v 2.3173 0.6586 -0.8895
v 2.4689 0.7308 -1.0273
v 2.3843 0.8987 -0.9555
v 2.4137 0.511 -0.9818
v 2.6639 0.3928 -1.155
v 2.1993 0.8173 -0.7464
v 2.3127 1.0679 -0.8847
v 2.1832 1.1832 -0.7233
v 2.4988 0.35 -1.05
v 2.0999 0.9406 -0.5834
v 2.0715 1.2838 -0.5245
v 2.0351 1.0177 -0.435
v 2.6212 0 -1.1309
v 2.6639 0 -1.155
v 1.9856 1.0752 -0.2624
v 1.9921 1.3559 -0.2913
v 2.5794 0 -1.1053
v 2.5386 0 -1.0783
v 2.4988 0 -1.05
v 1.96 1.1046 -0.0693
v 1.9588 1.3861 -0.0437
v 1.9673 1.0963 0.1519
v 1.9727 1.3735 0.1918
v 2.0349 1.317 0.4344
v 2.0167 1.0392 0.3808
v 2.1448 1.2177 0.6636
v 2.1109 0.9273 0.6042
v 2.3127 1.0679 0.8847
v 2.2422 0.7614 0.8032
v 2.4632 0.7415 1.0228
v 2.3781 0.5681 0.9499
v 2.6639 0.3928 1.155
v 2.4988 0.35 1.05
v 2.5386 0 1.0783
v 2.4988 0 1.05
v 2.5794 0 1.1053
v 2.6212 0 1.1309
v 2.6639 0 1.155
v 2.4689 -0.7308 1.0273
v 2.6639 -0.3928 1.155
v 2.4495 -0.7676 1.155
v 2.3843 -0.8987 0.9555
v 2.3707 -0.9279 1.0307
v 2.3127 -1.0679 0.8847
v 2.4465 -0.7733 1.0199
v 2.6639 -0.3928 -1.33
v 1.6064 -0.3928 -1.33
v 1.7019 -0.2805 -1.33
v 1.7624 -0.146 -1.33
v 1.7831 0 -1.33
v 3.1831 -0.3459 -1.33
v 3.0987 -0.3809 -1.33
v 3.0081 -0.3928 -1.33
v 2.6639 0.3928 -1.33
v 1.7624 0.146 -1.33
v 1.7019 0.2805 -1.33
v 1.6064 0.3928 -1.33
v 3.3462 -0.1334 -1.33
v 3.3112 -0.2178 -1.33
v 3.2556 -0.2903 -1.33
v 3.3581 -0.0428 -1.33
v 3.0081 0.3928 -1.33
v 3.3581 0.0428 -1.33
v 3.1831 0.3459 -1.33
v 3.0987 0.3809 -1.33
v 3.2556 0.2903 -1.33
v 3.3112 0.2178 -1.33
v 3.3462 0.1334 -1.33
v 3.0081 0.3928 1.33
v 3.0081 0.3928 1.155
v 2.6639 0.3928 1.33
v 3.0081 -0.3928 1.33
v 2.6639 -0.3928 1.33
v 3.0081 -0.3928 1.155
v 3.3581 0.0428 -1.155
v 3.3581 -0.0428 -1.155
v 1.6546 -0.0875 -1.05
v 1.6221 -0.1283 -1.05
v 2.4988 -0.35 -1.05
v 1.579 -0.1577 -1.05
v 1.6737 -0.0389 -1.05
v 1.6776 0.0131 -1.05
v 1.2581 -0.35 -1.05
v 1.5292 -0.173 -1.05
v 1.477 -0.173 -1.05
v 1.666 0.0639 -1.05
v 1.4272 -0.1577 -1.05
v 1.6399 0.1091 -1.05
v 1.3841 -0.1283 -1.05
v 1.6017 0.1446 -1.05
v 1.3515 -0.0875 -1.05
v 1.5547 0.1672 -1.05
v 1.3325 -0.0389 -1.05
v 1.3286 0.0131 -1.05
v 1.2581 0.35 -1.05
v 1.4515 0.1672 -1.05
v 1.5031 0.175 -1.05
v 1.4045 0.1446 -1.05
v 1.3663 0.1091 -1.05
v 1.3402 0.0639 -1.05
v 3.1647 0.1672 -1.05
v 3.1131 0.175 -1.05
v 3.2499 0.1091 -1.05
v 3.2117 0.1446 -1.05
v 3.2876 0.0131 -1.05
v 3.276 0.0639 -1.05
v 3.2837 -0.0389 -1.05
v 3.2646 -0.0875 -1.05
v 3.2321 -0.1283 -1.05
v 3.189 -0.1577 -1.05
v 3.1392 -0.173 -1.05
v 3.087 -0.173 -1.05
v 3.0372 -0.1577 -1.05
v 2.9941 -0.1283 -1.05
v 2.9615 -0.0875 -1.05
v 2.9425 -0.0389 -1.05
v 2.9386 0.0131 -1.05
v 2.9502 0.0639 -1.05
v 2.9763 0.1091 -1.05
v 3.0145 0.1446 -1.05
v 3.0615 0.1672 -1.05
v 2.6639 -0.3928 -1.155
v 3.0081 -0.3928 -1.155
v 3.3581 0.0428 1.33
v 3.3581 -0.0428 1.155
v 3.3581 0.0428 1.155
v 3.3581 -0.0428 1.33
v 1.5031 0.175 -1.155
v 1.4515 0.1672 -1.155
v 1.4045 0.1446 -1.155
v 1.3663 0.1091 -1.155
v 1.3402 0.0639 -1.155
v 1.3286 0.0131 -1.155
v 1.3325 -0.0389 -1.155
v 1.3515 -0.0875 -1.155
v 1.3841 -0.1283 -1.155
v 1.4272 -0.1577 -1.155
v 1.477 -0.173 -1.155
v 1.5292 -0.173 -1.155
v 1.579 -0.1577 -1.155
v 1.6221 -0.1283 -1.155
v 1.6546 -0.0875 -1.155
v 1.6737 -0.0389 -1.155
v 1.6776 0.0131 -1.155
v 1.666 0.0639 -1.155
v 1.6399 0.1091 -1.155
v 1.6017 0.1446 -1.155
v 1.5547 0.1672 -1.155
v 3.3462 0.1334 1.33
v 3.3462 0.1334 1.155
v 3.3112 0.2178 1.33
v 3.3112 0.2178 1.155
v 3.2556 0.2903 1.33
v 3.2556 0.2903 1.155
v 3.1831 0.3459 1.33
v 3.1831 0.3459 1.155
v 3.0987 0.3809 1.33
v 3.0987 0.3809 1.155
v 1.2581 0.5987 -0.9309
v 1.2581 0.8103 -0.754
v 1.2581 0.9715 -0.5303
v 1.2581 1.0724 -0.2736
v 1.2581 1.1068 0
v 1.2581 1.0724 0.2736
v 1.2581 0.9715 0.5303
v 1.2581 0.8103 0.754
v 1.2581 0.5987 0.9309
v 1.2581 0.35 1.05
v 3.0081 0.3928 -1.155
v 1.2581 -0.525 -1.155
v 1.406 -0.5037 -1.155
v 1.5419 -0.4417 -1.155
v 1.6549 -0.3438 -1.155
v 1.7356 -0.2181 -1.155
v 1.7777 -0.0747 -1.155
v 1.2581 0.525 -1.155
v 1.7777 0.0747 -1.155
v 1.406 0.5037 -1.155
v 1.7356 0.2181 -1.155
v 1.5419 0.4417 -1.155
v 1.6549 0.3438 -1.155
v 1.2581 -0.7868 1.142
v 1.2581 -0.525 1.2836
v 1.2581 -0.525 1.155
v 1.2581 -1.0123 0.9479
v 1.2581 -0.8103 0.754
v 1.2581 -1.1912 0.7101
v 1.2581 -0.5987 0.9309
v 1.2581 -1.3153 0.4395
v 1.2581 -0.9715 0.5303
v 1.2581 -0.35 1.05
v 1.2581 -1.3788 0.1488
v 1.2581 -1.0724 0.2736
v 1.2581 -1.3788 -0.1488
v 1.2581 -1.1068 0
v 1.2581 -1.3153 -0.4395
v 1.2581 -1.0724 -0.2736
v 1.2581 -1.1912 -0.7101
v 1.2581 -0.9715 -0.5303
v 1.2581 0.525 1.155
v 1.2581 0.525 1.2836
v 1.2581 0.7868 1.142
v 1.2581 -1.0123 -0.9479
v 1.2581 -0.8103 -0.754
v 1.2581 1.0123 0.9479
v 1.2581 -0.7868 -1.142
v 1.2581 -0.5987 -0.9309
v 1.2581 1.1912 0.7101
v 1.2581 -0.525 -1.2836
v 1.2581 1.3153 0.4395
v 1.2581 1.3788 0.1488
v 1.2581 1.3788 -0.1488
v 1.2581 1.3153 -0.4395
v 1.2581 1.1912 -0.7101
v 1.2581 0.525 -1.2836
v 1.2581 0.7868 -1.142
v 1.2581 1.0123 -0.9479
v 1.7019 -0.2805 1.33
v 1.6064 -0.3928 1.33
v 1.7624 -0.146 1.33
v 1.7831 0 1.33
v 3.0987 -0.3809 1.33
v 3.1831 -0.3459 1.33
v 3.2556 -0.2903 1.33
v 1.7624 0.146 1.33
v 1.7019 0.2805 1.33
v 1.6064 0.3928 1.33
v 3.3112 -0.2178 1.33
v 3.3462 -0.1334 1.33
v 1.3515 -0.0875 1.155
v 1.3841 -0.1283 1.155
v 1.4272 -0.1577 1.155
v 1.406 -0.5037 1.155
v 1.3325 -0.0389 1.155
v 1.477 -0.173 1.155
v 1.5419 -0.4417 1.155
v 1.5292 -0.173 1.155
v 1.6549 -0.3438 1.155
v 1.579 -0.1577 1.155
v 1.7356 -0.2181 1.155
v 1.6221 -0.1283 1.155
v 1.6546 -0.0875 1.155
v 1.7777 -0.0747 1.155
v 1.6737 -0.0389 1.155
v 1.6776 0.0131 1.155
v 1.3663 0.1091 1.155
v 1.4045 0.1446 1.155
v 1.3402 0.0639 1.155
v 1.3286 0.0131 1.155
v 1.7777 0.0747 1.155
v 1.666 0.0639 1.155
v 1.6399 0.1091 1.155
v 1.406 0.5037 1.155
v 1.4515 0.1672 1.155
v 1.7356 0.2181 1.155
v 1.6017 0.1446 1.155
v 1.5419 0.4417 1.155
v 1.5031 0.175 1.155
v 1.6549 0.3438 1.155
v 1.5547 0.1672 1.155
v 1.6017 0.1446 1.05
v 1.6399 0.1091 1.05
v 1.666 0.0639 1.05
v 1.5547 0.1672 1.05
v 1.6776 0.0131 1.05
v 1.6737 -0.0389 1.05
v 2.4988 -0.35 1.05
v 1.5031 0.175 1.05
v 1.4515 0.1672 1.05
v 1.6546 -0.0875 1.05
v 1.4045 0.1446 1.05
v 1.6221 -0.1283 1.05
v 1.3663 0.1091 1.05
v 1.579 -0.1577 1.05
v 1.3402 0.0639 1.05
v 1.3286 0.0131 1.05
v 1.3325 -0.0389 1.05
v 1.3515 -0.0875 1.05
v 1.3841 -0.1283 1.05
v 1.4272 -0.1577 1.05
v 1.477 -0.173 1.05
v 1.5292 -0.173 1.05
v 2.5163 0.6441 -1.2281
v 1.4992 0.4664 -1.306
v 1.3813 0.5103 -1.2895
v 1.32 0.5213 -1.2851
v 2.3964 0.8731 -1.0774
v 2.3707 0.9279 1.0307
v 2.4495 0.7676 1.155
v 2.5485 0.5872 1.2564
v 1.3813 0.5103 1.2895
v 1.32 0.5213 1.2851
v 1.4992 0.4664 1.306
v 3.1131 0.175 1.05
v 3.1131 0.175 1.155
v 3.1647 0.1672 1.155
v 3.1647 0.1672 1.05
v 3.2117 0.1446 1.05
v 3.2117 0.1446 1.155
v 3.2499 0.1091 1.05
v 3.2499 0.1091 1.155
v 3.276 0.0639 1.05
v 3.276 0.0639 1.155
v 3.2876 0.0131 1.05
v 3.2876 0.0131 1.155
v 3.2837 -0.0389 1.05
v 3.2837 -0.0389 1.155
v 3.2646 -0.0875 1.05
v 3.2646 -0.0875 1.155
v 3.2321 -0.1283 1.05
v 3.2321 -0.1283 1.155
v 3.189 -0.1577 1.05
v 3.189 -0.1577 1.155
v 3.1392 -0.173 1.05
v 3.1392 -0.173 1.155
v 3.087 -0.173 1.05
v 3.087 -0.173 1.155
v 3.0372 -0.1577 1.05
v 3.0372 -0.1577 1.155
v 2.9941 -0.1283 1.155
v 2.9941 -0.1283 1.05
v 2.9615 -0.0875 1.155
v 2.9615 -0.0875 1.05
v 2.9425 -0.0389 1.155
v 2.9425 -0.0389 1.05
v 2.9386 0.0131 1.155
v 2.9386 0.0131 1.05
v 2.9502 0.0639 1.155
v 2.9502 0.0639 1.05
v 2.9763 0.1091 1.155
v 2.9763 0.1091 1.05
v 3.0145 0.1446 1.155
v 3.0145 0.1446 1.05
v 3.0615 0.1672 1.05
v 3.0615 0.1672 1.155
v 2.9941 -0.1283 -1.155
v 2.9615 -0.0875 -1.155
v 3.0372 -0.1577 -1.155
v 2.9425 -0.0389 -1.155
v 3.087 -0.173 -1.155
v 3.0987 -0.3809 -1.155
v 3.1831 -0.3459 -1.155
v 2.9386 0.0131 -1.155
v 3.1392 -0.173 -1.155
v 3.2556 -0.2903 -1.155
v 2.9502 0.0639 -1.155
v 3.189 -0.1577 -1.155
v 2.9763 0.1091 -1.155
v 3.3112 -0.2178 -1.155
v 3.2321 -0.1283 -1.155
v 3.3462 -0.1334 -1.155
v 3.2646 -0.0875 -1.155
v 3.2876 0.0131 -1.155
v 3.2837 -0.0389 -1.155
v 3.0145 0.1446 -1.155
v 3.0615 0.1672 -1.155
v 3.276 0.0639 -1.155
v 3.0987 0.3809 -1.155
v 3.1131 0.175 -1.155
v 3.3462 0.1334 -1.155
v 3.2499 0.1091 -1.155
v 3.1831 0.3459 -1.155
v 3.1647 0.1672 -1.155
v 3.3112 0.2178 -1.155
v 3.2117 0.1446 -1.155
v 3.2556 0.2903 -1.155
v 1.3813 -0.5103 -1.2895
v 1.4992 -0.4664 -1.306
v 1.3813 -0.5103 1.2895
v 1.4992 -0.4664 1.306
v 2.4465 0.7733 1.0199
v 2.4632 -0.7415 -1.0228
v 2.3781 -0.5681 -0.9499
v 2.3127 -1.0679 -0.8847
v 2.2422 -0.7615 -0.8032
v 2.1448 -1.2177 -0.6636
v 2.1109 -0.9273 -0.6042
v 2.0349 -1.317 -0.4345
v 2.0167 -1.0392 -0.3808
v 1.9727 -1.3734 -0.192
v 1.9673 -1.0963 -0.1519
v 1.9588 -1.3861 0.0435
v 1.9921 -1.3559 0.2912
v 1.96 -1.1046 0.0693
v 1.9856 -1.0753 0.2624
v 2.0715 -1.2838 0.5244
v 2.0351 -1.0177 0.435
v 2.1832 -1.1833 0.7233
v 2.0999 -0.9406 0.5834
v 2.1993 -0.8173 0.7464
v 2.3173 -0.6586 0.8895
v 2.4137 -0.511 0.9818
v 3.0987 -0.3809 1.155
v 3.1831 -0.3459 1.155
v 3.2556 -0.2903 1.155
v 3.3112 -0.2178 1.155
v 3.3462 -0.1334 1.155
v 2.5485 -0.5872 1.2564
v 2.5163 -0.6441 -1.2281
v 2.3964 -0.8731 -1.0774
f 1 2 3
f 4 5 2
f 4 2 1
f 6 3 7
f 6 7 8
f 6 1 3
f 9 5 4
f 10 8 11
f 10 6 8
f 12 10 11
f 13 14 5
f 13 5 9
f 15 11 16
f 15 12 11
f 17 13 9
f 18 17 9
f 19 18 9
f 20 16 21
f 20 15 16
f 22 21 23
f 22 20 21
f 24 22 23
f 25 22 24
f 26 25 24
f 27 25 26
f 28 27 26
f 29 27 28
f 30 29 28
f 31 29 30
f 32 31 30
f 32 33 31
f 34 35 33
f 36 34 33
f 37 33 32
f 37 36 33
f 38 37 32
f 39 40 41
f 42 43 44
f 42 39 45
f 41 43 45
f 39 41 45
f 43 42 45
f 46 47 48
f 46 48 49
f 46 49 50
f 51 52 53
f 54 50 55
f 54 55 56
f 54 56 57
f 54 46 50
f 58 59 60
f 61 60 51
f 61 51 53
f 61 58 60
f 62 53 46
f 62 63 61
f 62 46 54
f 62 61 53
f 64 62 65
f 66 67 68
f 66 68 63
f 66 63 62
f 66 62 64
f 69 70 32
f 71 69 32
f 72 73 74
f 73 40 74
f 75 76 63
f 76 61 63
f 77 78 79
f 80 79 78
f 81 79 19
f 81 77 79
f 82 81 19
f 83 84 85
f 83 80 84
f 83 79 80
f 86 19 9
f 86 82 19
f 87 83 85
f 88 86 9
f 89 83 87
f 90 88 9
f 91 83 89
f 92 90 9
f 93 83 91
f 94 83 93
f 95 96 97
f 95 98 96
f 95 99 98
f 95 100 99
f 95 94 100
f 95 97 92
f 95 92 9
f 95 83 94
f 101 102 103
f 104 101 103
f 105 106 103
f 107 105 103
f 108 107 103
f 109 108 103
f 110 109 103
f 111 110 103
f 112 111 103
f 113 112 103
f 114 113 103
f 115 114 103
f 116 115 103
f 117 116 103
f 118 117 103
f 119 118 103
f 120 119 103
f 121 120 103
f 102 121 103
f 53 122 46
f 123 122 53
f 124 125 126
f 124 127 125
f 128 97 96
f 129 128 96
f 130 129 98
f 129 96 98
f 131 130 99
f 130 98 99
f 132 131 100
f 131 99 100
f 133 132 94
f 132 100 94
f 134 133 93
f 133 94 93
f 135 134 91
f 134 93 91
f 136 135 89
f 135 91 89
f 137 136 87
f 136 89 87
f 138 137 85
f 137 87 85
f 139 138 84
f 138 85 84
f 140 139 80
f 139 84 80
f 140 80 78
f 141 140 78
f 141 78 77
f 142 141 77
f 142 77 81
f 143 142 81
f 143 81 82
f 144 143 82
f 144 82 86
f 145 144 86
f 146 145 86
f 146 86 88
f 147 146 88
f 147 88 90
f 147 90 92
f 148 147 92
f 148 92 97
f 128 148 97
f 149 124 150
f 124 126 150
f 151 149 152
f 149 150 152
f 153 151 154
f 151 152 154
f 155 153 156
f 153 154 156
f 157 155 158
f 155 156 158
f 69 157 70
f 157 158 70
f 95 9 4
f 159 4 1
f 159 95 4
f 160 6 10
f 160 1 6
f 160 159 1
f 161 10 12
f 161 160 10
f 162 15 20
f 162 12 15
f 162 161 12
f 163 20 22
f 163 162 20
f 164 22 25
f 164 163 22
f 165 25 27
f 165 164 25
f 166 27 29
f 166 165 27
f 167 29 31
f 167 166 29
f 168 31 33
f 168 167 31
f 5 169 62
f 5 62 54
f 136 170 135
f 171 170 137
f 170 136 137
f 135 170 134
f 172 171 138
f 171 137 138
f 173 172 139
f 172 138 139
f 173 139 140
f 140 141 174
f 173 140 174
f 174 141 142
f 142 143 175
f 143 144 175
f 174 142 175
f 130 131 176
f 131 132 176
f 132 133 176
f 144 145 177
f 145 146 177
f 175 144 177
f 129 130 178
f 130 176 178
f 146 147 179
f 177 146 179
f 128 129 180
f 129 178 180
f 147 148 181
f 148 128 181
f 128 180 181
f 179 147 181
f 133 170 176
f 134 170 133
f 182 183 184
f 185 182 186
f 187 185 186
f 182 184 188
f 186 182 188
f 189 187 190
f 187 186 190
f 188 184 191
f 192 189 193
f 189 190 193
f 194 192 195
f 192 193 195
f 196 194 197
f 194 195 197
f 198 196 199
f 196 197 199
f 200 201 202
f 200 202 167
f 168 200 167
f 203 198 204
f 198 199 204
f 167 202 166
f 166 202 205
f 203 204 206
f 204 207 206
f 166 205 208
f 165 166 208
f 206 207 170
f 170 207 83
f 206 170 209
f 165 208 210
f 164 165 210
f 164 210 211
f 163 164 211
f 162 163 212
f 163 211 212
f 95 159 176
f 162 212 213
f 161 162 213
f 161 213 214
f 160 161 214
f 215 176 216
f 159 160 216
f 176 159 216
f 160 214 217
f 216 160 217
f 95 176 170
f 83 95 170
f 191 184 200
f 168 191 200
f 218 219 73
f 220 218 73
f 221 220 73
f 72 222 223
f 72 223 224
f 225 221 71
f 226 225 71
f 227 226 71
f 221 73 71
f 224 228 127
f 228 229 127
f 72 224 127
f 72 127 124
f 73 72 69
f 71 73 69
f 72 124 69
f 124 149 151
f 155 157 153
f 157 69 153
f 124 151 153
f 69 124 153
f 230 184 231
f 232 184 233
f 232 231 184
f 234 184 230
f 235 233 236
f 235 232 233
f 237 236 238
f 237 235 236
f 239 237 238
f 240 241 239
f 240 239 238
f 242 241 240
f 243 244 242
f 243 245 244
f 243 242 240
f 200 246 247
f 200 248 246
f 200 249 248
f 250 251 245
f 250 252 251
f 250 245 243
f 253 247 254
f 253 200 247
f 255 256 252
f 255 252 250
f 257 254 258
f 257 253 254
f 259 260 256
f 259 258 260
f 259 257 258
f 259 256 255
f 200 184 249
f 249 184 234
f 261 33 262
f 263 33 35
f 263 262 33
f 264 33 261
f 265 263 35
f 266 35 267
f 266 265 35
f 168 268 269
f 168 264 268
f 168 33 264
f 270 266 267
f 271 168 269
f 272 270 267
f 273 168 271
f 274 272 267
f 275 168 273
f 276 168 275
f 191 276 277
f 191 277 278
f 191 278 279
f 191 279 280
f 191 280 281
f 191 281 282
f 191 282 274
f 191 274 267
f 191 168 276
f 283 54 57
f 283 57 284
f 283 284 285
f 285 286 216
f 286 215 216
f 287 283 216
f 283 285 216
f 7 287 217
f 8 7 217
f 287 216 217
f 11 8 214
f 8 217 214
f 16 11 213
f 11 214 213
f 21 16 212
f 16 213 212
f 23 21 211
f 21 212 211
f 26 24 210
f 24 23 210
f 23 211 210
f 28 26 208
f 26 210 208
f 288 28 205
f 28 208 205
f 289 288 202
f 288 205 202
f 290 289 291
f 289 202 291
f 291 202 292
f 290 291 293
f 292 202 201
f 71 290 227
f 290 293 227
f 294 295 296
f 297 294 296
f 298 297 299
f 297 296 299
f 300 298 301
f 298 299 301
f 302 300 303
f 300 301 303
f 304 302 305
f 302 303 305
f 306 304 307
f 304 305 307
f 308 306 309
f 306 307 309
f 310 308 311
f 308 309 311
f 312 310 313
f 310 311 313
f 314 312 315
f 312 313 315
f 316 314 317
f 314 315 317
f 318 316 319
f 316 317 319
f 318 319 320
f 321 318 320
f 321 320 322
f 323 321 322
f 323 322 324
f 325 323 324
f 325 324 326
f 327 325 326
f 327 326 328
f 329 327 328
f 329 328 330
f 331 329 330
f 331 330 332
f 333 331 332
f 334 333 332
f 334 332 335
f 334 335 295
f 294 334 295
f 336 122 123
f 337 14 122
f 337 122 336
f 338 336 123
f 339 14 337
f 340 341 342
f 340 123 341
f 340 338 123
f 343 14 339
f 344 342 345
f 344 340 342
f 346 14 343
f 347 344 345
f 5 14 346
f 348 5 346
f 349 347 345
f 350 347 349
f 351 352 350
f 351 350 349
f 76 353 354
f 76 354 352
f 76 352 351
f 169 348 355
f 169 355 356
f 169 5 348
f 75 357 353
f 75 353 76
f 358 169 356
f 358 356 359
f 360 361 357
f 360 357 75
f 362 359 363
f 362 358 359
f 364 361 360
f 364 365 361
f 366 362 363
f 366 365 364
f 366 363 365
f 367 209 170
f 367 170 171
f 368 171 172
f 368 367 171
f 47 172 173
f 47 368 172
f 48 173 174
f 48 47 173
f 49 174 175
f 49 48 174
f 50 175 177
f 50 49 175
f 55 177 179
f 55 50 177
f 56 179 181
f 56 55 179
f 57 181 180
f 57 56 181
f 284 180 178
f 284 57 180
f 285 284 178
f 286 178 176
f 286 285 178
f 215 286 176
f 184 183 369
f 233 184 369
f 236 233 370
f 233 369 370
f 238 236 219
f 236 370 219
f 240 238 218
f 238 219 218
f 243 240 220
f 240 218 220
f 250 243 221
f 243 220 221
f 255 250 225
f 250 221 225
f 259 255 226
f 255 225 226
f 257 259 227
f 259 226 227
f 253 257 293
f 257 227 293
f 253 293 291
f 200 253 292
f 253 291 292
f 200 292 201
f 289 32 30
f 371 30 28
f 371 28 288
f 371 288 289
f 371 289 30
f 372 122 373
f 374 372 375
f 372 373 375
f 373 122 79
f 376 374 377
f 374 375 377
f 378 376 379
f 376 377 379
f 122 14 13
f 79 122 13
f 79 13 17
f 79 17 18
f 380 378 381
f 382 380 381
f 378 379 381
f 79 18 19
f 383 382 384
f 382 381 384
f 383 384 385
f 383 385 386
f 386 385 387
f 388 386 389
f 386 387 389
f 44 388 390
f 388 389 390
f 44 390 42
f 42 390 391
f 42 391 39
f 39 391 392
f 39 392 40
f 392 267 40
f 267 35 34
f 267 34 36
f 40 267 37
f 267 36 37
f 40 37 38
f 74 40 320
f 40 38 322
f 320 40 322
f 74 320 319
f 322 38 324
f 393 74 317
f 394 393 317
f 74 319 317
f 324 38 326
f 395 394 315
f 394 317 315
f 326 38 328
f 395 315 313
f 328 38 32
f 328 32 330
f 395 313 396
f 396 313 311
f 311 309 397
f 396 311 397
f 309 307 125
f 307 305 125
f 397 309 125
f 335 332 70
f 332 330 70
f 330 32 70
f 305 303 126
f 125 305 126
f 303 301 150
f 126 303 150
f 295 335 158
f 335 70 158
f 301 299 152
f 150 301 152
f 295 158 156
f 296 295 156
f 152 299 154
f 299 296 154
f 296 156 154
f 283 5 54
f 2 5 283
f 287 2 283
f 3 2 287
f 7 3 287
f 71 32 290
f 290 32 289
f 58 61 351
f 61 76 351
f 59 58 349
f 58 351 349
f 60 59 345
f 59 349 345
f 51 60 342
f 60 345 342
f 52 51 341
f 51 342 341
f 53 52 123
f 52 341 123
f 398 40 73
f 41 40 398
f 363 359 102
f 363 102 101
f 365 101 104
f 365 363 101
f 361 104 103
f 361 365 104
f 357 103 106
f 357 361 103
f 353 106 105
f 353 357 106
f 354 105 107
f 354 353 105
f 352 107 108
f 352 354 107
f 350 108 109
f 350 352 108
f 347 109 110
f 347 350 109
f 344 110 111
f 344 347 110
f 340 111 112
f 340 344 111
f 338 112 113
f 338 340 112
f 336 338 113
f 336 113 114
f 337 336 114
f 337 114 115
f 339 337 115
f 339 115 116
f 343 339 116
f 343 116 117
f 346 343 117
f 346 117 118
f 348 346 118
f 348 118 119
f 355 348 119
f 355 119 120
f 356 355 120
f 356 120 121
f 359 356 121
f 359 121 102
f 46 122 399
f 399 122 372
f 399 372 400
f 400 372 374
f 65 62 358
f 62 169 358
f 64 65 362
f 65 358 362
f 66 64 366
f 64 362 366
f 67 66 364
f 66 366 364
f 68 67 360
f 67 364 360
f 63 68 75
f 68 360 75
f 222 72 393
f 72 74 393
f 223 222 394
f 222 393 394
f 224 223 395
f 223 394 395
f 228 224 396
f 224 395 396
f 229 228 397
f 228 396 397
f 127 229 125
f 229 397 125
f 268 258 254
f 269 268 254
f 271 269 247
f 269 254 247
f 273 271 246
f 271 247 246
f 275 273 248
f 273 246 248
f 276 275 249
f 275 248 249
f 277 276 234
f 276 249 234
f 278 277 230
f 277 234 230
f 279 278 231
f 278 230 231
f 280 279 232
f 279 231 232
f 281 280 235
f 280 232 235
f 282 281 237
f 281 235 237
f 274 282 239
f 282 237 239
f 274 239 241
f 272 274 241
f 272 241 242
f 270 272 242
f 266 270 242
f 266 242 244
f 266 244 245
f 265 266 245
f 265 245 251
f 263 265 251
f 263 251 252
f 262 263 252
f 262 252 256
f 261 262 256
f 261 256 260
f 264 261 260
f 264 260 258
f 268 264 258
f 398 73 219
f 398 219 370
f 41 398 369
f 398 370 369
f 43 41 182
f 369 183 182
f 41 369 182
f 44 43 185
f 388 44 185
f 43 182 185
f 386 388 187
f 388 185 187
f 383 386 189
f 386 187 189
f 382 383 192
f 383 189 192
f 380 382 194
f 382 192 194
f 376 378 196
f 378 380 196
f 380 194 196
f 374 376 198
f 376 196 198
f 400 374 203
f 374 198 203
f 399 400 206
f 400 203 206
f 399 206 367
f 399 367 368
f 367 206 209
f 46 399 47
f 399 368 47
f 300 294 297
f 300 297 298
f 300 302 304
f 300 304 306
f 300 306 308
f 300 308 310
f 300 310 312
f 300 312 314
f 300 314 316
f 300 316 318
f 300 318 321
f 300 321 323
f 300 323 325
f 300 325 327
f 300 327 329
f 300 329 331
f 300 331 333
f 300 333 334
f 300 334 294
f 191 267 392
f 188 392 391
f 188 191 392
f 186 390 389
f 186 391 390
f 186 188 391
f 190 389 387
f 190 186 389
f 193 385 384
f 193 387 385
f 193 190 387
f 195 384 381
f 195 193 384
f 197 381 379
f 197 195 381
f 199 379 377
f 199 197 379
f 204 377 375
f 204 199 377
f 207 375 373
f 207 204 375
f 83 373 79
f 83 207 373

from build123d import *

# Parameters (mm, degrees)
DODANIE_WYCI_GNI_CIE2_DEPTH     = 6
SZKIC6_RX                       = 4
SZKIC6_RY                       = 3.8
WYTNIJ_WYCI_GNI_CIE4_DEPTH      = 4.96227766
WYTNIJ_WYCI_GNI_CIE4_DEPTH_BACK = 4.96227766
SZKIC10_W                       = 6
SZKIC10_H                       = 2.244677488
DODANIE_WYCI_GNI_CIE5_DEPTH     = 0.5
WYTNIJ_WYCI_GNI_CIE6_DEPTH      = 8.1000001
WYTNIJ_WYCI_GNI_CIE6_DEPTH_BACK = 1.5000001
ZAOKR_GLENIE3_R                 = 1
WYTNIJ_WYCI_GNI_CIE8_DEPTH      = 0.5
SZKIC14_R                       = 0.5
WYTNIJ_WYCI_GNI_CIE9_DEPTH      = 8.1000001
SZKIC12_R                       = 0.5
DODANIE_WYCI_GNI_CIE6_DEPTH     = 0.8
SKALA1_SCALE                    = 0.35


with BuildPart() as part:
    # Szkic4 → Dodanie-wyciągnięcie2 (new body)
    with BuildSketch(Plane(origin=(0, 0, 0), x_dir=(0, 0, -1), z_dir=(1, 0, 0))):
        with BuildLine():
            Line((-3.8, 1.122338744), (-3.8, -1.122338744))
            ThreePointArc((-3.8, -1.122338744), (0, -3.96227766), (3.8, -1.122338744))
            Line((3.8, -1.122338744), (3.8, 1.122338744))
            ThreePointArc((3.8, 1.122338744), (0, 3.96227766), (-3.8, 1.122338744))
        make_face()
        with BuildLine():
            ThreePointArc((3, 1), (0, 3.16227766), (-3, 1))
            Line((-3, 1), (-3, -1))
            ThreePointArc((-3, -1), (0, -3.16227766), (3, -1))
            Line((3, -1), (3, 1))
        make_face(mode=Mode.SUBTRACT)
    extrude(amount=DODANIE_WYCI_GNI_CIE2_DEPTH)

    # Szkic6 → Wytnij-wyciągnięcie4 (cut, two sides)
    with BuildSketch(Plane(origin=(0, 0, 0), x_dir=(1, 0, 0), z_dir=(0, 1, 0))) as wytnij_wyci_gni_cie4_sk:
        with Locations(Location((6, 0), (0, 0, 180))):
            Ellipse(SZKIC6_RX, SZKIC6_RY)
    extrude(amount=WYTNIJ_WYCI_GNI_CIE4_DEPTH, mode=Mode.SUBTRACT)
    extrude(wytnij_wyci_gni_cie4_sk.sketch, amount=-WYTNIJ_WYCI_GNI_CIE4_DEPTH_BACK, mode=Mode.SUBTRACT)

    # Szkic10 → Dodanie-wyciągnięcie5 (add)
    with BuildSketch(Plane.XY.offset(3.8)):
        with Locations((3, 0)):
            Rectangle(SZKIC10_W, SZKIC10_H)
    dodanie_wyci_gni_cie5 = extrude(amount=-DODANIE_WYCI_GNI_CIE5_DEPTH)

    # Szkic11 → Wytnij-wyciągnięcie6 (cut, two sides)
    with BuildSketch(Plane(origin=(0, 0, 3.3), x_dir=(-1, 0, 0), z_dir=(0, 0, -1))) as wytnij_wyci_gni_cie6_sk:
        with BuildLine():
            Line((-6, -3.622338744), (-2.871743963, -3.622338744))
            add(Edge.make_bspline(
                [(-4.016690139, -1.122338744), (-2.925616262, -2.903897768), (-2.871743963, -3.622338744)],
                knots=[0, 0, 0, 1, 1, 1], degree=2))
            Line((-4.016690139, -1.122338744), (-6, -1.122338744))
            Line((-6, -1.122338744), (-6, -3.622338744))
        make_face()
        with BuildLine():
            Line((-6, 1.122338744), (-4.016690139, 1.122338744))
            add(Edge.make_bspline(
                [(-4.016690139, 1.122338744), (-2.925616262, 2.903897768), (-2.871743963, 3.622338744)],
                knots=[0, 0, 0, 1, 1, 1], degree=2))
            Line((-2.871743963, 3.622338744), (-6, 3.622338744))
            Line((-6, 3.622338744), (-6, 1.122338744))
        make_face()
    extrude(amount=WYTNIJ_WYCI_GNI_CIE6_DEPTH, mode=Mode.SUBTRACT)
    extrude(wytnij_wyci_gni_cie6_sk.sketch, amount=-WYTNIJ_WYCI_GNI_CIE6_DEPTH_BACK, mode=Mode.SUBTRACT)

    # Lustro2: Dodanie-wyciągnięcie5 across plane
    add(dodanie_wyci_gni_cie5.mirror(Plane.XY))

    # Zaokrąglenie3
    zaokr_glenie3_edges = [part.edges().sort_by_distance(p)[0] for p in [
        (6, 1.122338744, -3.55),
        (6, -1.122338744, -3.55),
        (6, -1.122338744, 3.55),
        (6, 1.122338744, 3.55),
    ]]
    fillet(zaokr_glenie3_edges, radius=ZAOKR_GLENIE3_R)

    # Szkic13 → Wytnij-wyciągnięcie8 (cut)
    with BuildSketch(Plane.XY.offset(3.8)):
        with BuildLine():
            Line((0, 1.5), (0, -1.5))
            ThreePointArc((0, -1.5), (1.5, 0), (0, 1.5))
        make_face()
    wytnij_wyci_gni_cie8 = extrude(amount=-WYTNIJ_WYCI_GNI_CIE8_DEPTH, mode=Mode.SUBTRACT)

    # Lustro3: Wytnij-wyciągnięcie8 across plane
    add(wytnij_wyci_gni_cie8.mirror(Plane.XY), mode=Mode.SUBTRACT)

    # Szkic14 → Wytnij-wyciągnięcie9 (cut, through all)
    with BuildSketch(Plane.XY.offset(3.3)):
        with Locations(Location((0.7, 0, 0), (0, 0, 90))):  # turned: the seam where the file's is
            Circle(SZKIC14_R)
    extrude(amount=-WYTNIJ_WYCI_GNI_CIE9_DEPTH, mode=Mode.SUBTRACT)

    # Szkic12 → Dodanie-wyciągnięcie6 (add)
    with BuildSketch(Plane(origin=(0, 0, -3.8), x_dir=(-1, 0, 0), z_dir=(0, 0, -1))):
        with Locations(Location((-5.3, 0, 0), (0, 0, 90))):  # turned: the seam where the file's is
            Circle(SZKIC12_R)
    dodanie_wyci_gni_cie6 = extrude(amount=-DODANIE_WYCI_GNI_CIE6_DEPTH)

    # Lustro4: Dodanie-wyciągnięcie6 across plane
    add(dodanie_wyci_gni_cie6.mirror(Plane.XY))


with BuildPart() as part_1:
    # Skala1: scaled about (1.935517978, -1.129e-06, 5.07e-07)
    add(part.part.scale(SKALA1_SCALE).moved(Location((1.258086686, -7.34e-07, 3.3e-07))))


solid = part_1.part
